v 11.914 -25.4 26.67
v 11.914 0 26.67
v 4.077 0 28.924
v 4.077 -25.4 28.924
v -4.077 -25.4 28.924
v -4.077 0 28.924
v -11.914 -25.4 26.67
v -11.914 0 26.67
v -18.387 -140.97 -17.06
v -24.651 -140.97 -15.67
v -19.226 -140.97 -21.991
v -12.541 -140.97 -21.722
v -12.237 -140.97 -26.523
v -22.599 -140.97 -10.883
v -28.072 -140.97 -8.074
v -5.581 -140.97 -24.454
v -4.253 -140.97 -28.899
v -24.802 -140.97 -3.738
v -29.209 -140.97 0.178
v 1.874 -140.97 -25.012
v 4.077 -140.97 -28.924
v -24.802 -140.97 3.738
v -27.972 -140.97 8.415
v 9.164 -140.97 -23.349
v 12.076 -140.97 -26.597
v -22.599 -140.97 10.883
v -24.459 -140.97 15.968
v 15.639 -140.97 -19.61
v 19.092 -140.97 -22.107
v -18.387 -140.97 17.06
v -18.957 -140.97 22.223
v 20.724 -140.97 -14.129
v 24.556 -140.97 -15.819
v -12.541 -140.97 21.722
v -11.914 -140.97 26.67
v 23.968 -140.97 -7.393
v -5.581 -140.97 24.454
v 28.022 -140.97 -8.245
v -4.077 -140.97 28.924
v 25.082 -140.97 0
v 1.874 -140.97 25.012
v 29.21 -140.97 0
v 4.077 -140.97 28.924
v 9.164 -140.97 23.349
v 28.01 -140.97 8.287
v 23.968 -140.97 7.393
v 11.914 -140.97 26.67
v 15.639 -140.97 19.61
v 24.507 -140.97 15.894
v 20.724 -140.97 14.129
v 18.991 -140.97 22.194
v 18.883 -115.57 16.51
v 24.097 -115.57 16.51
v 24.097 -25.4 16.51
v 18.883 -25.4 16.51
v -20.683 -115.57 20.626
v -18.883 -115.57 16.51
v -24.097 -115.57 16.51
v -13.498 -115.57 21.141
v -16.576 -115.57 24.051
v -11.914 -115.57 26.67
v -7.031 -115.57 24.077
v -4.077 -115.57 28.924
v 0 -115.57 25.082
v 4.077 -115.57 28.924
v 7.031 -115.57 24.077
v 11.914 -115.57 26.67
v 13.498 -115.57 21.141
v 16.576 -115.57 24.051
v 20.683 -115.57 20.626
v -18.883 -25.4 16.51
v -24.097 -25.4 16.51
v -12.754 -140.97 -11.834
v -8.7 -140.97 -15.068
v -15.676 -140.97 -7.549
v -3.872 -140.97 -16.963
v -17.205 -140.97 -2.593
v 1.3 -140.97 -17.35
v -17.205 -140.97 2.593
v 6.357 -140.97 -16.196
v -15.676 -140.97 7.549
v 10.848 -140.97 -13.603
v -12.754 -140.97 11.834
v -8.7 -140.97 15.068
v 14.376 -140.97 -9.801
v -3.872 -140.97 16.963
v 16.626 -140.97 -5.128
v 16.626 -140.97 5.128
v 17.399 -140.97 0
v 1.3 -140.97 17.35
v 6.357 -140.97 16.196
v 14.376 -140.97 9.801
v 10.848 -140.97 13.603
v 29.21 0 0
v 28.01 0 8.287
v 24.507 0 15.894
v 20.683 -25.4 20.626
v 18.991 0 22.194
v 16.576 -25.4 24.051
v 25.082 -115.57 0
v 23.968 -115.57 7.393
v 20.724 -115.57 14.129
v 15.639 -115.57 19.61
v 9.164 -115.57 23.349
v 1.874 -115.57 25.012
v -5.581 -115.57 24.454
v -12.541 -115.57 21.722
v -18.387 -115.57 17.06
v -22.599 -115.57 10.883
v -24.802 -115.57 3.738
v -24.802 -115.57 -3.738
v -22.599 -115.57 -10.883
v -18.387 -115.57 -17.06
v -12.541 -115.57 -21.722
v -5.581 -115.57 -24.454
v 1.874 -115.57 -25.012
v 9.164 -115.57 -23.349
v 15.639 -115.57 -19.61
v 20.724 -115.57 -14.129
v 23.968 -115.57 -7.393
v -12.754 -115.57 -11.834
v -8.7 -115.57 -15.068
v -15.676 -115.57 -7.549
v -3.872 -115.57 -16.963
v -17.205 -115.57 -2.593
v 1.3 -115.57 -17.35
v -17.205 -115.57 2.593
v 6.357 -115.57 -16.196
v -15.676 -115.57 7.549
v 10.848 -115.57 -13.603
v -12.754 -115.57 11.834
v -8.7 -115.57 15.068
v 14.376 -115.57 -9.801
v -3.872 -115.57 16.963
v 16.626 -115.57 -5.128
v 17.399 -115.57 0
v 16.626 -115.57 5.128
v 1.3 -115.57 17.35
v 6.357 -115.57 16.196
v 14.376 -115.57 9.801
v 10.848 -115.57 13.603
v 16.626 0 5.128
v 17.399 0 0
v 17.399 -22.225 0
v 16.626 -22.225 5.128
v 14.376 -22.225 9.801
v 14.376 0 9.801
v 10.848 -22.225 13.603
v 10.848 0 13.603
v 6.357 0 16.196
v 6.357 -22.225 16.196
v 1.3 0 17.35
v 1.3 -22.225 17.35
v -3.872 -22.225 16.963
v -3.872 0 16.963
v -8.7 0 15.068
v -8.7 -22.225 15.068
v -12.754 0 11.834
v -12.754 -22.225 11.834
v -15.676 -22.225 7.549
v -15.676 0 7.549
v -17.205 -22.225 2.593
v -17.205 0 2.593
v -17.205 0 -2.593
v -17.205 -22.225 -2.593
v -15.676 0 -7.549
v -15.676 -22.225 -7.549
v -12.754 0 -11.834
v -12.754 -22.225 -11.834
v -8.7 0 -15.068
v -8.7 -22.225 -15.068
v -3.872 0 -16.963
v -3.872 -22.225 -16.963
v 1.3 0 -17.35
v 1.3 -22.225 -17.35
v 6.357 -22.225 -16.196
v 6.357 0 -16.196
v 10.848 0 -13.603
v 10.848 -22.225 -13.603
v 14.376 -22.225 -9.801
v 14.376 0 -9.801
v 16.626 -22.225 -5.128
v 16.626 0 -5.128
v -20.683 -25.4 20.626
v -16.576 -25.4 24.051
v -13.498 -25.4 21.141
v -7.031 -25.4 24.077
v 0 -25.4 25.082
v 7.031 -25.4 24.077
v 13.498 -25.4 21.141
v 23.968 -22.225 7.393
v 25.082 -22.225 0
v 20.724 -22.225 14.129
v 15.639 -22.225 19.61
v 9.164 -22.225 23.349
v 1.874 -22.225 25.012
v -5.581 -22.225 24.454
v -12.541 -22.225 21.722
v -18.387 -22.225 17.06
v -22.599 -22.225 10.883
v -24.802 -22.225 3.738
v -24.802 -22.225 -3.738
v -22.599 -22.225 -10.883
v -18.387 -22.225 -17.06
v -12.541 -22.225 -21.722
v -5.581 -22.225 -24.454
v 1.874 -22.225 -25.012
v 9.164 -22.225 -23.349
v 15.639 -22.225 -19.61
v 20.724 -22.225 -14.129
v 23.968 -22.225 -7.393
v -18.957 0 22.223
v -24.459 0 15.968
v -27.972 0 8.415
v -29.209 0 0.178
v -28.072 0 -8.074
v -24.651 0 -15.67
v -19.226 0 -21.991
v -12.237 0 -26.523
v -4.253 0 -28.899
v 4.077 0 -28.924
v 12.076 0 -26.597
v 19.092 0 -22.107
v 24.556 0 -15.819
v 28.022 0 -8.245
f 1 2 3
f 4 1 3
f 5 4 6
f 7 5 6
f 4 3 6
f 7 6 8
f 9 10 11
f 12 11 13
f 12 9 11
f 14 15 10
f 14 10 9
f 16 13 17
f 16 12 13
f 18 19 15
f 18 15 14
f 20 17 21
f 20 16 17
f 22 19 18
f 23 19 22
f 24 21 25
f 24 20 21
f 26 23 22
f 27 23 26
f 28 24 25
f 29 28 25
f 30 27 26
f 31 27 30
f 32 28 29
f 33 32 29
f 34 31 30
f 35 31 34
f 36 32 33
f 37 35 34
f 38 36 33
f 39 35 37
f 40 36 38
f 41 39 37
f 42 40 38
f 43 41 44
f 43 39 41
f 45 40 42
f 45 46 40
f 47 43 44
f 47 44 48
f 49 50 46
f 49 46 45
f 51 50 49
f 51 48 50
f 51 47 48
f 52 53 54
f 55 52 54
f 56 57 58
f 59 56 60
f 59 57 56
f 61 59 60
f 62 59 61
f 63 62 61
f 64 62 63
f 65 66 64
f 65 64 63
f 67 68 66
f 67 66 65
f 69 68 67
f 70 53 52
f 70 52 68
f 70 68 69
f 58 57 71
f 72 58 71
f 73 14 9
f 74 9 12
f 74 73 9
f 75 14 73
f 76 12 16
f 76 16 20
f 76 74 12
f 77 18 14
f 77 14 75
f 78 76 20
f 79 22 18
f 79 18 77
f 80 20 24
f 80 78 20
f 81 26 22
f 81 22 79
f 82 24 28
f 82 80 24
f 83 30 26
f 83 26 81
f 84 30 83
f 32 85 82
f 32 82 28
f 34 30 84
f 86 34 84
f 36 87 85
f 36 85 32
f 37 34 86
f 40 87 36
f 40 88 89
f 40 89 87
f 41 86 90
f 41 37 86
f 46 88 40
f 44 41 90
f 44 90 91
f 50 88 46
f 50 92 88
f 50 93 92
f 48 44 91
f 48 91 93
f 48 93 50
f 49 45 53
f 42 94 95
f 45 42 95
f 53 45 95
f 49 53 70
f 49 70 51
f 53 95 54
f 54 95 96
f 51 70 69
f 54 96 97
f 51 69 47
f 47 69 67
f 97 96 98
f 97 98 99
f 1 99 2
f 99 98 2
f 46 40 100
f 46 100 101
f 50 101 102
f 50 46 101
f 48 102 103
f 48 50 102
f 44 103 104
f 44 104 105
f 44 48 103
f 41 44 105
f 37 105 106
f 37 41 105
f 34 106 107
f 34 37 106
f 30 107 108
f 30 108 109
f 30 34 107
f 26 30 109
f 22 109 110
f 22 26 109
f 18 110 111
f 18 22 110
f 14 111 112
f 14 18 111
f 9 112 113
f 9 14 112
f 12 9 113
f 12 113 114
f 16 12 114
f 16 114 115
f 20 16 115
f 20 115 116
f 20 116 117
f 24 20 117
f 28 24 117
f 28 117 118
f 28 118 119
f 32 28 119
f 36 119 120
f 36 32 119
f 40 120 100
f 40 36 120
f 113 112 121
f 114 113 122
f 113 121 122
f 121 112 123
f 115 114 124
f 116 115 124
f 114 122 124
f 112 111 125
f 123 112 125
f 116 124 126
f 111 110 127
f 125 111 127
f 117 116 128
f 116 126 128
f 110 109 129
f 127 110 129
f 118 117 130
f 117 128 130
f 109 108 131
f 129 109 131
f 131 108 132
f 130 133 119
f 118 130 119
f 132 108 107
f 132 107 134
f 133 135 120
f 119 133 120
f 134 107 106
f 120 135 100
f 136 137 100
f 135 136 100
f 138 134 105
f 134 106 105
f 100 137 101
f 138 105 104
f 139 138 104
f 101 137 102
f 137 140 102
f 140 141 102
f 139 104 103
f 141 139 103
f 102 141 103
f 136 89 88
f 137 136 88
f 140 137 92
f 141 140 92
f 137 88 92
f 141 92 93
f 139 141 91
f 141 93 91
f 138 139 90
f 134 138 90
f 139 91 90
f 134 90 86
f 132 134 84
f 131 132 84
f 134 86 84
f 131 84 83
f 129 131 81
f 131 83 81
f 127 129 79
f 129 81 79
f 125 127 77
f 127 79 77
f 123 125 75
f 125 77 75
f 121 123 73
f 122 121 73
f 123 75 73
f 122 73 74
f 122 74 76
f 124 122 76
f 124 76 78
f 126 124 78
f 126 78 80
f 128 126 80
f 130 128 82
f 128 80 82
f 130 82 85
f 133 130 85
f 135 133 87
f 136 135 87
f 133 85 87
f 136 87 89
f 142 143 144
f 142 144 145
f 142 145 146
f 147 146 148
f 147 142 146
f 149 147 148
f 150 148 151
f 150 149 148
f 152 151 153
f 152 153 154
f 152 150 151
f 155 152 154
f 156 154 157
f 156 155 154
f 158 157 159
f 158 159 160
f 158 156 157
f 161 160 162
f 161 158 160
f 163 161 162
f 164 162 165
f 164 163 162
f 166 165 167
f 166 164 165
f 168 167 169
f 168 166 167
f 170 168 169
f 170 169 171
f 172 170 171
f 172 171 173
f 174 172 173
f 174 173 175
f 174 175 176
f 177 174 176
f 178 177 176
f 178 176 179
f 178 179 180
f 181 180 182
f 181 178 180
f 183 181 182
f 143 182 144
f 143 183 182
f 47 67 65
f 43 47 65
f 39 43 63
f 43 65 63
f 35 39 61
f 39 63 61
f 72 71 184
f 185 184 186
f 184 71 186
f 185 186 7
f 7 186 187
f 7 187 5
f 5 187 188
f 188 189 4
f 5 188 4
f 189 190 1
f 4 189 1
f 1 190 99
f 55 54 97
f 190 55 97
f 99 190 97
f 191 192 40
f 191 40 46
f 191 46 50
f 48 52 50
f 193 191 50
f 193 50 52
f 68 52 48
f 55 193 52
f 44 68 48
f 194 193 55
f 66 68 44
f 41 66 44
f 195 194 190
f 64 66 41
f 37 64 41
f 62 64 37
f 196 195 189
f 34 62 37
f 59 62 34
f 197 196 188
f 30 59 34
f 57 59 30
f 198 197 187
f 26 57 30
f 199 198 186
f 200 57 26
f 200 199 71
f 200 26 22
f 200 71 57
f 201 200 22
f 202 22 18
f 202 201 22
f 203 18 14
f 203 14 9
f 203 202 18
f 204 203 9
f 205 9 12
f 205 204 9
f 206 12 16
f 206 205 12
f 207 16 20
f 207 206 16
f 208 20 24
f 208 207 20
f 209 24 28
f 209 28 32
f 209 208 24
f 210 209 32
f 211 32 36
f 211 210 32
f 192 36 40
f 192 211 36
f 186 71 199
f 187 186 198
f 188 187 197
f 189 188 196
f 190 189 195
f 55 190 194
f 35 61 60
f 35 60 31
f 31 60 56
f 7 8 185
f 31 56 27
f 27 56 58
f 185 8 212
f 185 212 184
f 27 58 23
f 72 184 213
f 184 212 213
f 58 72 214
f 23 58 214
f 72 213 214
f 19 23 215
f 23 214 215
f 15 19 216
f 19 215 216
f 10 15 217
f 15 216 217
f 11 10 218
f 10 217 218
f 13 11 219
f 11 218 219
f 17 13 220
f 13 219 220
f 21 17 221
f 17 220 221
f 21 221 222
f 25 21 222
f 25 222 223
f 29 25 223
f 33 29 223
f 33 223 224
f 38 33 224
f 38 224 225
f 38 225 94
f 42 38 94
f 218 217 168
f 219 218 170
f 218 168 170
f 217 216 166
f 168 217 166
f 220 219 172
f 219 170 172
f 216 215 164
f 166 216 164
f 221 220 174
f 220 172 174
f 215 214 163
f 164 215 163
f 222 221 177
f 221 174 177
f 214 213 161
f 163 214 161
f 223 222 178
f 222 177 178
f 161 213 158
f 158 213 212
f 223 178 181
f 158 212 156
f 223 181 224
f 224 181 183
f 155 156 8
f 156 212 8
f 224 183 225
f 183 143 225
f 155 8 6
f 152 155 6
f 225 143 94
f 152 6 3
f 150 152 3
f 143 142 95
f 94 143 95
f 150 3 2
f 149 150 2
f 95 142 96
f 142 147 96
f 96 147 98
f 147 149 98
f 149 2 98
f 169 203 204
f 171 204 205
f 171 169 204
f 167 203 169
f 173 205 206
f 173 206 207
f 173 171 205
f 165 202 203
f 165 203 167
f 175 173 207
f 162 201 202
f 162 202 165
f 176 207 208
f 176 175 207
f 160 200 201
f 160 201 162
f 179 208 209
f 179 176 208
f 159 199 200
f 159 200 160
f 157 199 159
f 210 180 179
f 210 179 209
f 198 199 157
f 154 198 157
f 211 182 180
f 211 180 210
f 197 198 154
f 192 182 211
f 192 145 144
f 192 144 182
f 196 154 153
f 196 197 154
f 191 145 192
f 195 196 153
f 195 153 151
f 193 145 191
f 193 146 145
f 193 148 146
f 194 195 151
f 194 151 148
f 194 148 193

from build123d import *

# Parameters (mm, degrees)
F0_R     = 25.0825
F0_R_2   = 17.399
F1_DEPTH = 22.225
F2_DEPTH = 140.97
F3_W     = 90.17
F3_H     = 12.7
F4_DEPTH = 38.1
F5_R     = 25.0825
F5_R_2   = 17.399
F6_DEPTH = 25.4


with BuildPart() as f1:
    # F0 (on Front) → F1 (new body)
    with BuildSketch(Plane.XZ):
        Circle(F0_R)
        Circle(F0_R_2, mode=Mode.SUBTRACT)
    extrude(amount=F1_DEPTH)

    # F0 (on Front) → F2 (join)
    with BuildSketch(Plane.XZ):
        with BuildLine():
            ThreePointArc((-11.91365603, 26.67), (-15.8938070859, -24.5073661644), (29.21, 0))
            ThreePointArc((29.21, 0), (24.5073661644, 15.8938070859), (11.91365603, 26.67))
            Line((11.91365603, 26.67), (-11.91365603, 26.67))
        make_face()
        Circle(F0_R, mode=Mode.SUBTRACT)
        with BuildLine():
            Line((-11.91365603, 26.67), (11.91365603, 26.67))
            ThreePointArc((11.91365603, 26.67), (0, 29.21), (-11.91365603, 26.67))
        make_face()
    extrude(amount=F2_DEPTH)

    # F3 (on Right) → F4 (cut, symmetric)
    with BuildSketch(Plane.YZ):
        with Locations((-70.485, 22.86)):
            Rectangle(F3_W, F3_H)
    extrude(amount=F4_DEPTH, both=True, mode=Mode.SUBTRACT)


with BuildPart() as f6:
    # F5 (on face) → F6 (new body)
    with BuildSketch(Plane.XZ.offset(140.97)):
        Circle(F5_R)
        Circle(F5_R_2, mode=Mode.SUBTRACT)
    extrude(amount=-F6_DEPTH)


solid = Compound([f1.part, f6.part])
